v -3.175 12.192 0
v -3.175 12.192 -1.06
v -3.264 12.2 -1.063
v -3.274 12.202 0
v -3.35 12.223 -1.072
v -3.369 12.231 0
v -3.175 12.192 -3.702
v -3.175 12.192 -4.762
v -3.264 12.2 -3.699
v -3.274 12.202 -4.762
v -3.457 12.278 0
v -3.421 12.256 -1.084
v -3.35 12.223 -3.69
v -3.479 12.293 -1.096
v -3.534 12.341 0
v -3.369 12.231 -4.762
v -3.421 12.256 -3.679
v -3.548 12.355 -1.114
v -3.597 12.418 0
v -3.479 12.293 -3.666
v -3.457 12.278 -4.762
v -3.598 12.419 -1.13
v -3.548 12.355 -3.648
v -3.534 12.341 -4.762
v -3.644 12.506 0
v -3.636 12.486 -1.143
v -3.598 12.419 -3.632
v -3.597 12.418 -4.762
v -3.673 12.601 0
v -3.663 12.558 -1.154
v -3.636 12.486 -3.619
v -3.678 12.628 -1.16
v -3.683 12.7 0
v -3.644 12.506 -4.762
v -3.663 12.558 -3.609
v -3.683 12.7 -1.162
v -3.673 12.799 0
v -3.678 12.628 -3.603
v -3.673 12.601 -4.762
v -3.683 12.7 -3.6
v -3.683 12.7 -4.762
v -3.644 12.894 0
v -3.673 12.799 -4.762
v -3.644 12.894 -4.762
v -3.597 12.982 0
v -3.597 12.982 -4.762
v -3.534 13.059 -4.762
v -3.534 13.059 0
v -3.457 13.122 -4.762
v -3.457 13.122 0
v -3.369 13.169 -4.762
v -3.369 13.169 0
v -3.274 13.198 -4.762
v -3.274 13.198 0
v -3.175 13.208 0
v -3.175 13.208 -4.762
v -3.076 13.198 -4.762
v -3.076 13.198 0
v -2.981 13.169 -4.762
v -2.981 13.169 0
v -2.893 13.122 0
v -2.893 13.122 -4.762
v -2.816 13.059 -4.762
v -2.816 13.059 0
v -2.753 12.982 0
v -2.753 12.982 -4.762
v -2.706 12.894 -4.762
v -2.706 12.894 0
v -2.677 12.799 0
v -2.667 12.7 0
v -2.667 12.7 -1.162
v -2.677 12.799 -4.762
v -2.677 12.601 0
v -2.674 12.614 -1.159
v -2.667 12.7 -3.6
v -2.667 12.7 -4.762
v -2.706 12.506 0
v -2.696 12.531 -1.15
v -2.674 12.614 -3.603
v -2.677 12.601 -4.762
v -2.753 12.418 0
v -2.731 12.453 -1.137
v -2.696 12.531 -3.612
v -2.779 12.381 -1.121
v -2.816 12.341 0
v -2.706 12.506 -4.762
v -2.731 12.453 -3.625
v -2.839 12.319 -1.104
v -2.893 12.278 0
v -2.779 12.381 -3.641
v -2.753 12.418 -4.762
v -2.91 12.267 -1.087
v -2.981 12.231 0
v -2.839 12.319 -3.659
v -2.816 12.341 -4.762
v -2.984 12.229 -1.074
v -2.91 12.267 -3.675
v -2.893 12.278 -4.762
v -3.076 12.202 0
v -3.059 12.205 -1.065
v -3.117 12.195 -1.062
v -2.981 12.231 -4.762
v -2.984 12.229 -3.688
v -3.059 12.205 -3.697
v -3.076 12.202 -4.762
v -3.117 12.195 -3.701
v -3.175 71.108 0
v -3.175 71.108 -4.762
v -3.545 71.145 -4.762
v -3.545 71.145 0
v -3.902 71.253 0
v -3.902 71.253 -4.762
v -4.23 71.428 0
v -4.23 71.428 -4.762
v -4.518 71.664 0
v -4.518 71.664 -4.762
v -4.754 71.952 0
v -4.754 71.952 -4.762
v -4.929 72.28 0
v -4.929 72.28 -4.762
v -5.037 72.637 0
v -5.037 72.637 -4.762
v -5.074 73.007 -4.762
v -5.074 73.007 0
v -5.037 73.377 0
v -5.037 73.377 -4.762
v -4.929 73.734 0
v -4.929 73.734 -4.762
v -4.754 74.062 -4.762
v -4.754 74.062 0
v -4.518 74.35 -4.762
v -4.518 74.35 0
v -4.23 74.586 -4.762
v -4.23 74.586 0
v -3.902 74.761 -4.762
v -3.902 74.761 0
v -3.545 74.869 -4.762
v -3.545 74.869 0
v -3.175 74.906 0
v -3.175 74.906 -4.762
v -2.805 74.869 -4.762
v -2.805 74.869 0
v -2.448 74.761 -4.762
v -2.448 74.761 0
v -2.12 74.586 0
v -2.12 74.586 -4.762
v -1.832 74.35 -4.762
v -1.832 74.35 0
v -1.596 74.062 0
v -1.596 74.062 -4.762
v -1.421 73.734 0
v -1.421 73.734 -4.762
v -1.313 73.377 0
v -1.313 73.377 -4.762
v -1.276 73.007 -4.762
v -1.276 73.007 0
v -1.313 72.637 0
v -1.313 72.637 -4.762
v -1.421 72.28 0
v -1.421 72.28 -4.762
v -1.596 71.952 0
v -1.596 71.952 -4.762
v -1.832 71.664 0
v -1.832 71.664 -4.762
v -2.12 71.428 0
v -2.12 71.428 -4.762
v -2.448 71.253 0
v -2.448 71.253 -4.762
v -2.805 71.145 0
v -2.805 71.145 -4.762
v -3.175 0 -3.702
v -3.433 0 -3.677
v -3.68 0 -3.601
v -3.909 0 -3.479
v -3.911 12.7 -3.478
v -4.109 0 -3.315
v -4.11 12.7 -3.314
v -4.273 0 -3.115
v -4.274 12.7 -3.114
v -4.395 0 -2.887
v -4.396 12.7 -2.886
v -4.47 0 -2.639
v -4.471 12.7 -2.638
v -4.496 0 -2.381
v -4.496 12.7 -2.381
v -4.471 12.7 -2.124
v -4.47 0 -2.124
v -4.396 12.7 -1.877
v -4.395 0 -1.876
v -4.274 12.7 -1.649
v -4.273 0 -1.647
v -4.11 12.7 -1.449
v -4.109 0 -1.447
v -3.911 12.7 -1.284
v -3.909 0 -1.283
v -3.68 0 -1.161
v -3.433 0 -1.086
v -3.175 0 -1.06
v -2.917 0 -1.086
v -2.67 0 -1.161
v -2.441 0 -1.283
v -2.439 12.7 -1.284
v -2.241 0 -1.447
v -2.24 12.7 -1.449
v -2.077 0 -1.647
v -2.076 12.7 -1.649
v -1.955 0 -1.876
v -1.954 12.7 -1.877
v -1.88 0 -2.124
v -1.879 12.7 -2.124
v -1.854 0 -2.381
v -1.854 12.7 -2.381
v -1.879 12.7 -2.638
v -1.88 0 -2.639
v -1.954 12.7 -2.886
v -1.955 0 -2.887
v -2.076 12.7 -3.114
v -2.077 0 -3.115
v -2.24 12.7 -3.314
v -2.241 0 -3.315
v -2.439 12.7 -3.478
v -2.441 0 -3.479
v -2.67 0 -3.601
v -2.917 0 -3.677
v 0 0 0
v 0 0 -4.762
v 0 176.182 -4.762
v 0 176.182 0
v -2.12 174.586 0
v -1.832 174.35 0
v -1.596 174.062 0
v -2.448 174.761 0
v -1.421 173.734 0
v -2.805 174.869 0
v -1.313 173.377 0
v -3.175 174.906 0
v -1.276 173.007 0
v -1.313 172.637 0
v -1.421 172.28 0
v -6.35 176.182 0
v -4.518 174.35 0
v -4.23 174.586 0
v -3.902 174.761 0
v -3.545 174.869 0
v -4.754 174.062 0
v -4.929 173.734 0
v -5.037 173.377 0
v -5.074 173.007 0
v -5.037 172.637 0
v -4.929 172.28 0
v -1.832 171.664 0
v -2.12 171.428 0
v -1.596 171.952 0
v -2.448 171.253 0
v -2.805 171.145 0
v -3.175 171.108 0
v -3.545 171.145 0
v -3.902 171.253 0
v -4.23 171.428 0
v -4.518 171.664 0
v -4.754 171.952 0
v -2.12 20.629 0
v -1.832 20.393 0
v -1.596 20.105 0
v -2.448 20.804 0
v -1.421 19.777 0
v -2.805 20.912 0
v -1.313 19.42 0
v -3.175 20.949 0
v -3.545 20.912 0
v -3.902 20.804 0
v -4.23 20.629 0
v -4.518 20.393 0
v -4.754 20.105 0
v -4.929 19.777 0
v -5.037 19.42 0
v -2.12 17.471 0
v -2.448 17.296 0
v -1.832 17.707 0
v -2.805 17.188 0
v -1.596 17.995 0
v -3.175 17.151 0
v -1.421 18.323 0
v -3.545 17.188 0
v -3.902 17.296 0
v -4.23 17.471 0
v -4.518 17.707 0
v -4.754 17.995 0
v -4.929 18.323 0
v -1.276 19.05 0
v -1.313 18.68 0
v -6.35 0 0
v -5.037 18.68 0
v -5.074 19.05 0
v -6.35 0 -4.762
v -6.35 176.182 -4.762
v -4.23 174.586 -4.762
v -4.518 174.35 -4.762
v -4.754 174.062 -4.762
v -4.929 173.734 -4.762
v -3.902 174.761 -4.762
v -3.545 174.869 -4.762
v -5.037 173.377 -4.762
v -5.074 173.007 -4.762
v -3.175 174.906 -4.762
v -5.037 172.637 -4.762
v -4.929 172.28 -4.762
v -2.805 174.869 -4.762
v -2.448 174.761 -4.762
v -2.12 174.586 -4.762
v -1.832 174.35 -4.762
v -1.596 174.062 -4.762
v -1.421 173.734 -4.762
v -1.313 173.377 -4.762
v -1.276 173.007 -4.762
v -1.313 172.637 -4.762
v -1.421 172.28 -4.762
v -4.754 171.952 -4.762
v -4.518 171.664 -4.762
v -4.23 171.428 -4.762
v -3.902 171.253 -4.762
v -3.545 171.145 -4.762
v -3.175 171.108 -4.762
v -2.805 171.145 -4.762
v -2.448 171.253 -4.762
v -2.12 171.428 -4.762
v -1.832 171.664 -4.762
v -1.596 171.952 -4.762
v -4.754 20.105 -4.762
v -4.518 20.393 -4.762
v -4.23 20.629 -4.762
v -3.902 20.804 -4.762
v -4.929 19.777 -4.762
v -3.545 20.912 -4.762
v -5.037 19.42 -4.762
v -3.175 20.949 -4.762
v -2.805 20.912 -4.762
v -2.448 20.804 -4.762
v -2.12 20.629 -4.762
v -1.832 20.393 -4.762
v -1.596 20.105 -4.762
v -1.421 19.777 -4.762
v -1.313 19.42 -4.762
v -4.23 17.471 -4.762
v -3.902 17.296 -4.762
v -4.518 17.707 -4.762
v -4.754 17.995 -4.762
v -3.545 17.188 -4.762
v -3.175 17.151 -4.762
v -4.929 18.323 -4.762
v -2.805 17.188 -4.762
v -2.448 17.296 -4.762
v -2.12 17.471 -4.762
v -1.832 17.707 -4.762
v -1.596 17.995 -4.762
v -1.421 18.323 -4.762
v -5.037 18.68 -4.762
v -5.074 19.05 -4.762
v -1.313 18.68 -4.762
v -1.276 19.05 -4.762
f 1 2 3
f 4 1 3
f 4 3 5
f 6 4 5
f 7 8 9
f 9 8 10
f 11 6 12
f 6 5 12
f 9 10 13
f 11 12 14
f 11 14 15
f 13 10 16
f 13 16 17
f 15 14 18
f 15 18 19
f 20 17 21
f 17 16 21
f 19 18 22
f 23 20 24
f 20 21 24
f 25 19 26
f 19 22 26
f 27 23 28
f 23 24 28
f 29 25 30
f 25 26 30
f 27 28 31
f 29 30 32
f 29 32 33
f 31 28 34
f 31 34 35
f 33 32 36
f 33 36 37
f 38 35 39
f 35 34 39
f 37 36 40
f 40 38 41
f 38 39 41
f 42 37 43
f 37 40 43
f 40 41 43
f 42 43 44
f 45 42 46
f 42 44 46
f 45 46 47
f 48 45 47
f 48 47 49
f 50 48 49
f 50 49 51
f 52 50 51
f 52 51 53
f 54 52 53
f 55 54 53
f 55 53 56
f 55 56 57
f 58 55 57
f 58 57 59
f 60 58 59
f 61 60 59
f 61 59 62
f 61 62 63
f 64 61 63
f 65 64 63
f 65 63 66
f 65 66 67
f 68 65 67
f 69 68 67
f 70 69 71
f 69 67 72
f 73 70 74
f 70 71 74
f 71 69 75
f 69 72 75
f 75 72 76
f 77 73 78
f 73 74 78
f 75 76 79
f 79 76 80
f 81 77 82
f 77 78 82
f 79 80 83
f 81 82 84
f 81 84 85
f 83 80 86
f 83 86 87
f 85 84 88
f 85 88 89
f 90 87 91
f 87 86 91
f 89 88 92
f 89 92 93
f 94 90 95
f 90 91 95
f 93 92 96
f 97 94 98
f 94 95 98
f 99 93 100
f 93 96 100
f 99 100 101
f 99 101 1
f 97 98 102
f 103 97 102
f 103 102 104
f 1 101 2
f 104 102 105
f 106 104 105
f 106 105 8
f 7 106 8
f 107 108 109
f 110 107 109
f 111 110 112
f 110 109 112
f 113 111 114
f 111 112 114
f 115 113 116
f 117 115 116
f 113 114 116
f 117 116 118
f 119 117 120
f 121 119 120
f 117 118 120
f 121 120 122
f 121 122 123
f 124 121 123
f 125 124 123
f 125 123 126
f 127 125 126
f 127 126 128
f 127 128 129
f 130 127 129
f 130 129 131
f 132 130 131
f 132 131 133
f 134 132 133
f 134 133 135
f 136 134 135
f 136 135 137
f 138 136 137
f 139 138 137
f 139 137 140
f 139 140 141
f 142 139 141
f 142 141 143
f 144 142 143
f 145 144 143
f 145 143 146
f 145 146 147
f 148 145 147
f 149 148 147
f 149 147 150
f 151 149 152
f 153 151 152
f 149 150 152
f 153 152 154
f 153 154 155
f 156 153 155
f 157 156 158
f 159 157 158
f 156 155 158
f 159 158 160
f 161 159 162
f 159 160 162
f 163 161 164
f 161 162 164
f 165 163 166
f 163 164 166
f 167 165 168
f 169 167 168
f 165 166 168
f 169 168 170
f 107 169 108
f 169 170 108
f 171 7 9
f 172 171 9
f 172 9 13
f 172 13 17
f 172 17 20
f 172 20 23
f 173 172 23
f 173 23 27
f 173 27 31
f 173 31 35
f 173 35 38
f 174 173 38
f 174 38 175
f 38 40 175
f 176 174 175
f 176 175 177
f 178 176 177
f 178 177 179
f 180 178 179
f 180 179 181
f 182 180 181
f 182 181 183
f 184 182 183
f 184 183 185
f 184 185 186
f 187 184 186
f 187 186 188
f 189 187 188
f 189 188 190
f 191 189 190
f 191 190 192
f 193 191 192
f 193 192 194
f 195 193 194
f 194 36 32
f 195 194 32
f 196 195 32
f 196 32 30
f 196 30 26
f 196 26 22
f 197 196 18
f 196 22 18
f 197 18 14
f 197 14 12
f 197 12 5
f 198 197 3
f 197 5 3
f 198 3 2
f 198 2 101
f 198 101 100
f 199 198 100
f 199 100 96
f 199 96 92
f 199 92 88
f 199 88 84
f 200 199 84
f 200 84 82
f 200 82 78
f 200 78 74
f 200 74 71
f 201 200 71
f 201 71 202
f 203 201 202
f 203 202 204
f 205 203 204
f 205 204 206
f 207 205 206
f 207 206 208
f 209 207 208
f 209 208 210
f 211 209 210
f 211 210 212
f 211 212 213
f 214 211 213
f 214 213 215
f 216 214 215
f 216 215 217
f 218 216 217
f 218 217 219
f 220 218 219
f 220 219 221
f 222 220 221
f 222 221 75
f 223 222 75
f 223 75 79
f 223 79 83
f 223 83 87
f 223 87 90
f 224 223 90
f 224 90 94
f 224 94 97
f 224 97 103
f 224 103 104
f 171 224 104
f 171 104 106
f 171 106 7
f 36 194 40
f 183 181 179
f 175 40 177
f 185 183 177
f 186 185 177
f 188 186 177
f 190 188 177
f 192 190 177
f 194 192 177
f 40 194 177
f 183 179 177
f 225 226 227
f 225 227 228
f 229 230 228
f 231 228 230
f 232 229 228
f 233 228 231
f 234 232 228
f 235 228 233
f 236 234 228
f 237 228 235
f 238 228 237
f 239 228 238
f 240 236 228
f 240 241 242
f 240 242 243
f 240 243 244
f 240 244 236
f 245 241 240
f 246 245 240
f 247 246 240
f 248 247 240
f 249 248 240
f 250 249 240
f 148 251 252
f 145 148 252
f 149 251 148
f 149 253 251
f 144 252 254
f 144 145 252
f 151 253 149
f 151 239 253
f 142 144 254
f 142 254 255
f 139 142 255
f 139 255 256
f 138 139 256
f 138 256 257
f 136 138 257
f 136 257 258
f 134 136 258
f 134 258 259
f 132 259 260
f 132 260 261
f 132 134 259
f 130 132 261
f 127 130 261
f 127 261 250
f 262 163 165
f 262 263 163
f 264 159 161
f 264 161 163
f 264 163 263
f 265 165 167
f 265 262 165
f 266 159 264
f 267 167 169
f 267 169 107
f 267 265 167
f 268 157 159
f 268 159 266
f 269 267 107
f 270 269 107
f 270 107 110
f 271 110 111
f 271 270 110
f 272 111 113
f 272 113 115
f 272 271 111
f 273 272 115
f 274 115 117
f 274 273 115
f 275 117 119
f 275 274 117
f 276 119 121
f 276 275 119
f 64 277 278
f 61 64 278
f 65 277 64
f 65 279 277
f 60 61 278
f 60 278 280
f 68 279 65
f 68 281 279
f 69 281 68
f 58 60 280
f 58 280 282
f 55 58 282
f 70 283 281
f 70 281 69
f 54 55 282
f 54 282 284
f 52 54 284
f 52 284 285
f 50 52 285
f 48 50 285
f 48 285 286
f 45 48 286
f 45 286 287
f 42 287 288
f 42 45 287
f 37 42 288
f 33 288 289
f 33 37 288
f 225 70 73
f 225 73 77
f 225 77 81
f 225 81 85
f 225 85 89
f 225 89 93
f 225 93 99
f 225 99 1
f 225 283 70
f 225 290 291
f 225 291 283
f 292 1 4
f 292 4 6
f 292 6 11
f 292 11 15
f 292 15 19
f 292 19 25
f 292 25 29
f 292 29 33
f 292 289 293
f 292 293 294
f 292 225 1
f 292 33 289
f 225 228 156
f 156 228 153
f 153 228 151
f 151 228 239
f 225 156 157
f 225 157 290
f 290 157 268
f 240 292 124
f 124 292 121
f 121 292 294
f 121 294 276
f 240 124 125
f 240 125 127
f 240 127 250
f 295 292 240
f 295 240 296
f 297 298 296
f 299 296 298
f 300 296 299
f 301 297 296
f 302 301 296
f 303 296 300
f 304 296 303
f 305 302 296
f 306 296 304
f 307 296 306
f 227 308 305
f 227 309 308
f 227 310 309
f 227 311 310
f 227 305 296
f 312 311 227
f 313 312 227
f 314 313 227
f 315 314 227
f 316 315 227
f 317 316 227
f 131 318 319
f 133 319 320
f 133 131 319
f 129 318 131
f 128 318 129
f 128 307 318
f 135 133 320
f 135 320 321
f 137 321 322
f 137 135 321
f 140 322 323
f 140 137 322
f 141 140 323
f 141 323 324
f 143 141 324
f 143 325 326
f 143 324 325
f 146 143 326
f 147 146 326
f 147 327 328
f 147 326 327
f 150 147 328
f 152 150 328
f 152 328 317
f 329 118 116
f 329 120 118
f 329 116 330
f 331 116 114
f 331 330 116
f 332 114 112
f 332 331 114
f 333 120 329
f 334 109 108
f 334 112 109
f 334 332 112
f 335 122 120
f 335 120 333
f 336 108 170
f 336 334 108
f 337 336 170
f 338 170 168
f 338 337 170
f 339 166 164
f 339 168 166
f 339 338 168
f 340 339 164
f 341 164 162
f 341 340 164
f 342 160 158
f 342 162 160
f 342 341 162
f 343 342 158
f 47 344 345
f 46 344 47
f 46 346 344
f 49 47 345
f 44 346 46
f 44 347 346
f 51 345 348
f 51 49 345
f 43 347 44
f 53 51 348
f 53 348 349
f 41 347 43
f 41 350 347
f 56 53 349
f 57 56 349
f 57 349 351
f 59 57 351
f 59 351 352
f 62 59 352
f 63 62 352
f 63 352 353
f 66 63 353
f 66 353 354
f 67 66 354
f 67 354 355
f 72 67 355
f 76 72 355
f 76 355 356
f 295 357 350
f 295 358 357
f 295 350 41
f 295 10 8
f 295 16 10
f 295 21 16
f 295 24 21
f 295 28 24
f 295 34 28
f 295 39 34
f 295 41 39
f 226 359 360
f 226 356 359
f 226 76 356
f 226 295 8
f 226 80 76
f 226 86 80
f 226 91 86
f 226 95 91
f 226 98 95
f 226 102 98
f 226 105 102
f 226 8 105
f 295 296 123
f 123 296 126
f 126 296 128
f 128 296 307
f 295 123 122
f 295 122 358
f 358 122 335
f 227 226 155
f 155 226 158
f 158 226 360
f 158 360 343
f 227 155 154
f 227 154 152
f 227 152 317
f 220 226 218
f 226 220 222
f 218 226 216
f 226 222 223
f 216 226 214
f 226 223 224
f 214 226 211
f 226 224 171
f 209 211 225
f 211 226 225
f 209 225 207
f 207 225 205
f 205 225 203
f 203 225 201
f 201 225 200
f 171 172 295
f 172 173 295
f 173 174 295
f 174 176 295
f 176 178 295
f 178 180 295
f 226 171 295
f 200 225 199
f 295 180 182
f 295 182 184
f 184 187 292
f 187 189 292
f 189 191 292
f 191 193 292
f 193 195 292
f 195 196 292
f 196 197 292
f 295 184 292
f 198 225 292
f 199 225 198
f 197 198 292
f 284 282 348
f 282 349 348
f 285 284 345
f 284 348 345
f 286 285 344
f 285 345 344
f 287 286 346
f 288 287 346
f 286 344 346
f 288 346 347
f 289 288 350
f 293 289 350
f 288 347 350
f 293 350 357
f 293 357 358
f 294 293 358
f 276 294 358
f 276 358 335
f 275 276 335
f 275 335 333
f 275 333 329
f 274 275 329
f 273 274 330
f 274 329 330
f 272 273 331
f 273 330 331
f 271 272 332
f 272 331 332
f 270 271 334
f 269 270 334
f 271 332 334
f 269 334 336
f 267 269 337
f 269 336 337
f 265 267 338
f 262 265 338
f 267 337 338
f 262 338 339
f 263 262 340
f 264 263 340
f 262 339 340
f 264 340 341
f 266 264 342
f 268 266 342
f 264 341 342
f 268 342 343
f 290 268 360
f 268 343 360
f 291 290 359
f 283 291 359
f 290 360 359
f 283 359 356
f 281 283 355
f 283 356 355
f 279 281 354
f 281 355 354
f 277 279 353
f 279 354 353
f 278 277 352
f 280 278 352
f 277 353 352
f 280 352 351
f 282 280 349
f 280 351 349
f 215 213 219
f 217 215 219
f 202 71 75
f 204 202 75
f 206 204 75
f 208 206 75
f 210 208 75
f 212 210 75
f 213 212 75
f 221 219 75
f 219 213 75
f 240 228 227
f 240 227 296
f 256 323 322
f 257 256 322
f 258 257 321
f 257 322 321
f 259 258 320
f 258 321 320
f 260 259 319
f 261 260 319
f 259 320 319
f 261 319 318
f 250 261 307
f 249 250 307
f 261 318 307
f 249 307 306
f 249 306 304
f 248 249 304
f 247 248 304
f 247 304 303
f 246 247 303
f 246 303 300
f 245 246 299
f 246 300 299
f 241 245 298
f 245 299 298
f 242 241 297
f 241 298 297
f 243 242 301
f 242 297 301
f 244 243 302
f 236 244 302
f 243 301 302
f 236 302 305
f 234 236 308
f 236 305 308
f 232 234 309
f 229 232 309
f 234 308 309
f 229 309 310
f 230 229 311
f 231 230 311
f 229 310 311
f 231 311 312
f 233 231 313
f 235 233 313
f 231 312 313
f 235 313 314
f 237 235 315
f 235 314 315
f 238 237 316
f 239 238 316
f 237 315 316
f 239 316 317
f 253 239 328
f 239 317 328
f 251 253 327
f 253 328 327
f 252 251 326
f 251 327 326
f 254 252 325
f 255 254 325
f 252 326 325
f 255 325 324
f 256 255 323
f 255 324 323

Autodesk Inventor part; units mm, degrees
ref_plane "YZ Plane" through (0, 0, 0) normal (1, 0, 0) x (0, 1, 0)
ref_plane "XZ Plane" through (0, 0, 0) normal (0, 1, 0) x (-1, 0, 0)
ref_plane "XY Plane" through (0, 0, 0) normal (0, 0, 1) x (1, 0, 0)
sketch "Sketch1" plane through (0, 0, 0) normal (0, 1, 0) x (-1, 0, 0)
  line L0 (0, 0) -> (6.35, 0)
  line L1 (6.35, 0) -> (6.35, -4.7625)
  line L2 (6.35, -4.7625) -> (0, -4.7625)
  line L3 (0, -4.7625) -> (0, 0)
  circle A0 centre (3.175, -2.3812) radius 1.7526
  dimension "d0" = 6.35
  dimension "d1" = 4.7625
  dimension "d2" = 3.5052
extrude "Extrusion1" add sketch "Sketch1" along normal blind 176.182 contours L0 L1 L2 L3 | A0
sketch "Sketch2" plane through (-6.35, 0, 0) normal (0, 0, 1) x (1, 0, 0)
  line L0 (6.35, 176.182) -> (0, 176.182) projected
  line L1 (3.175, 176.182) -> (3.175, 173.007)
  circle A0 centre (3.175, 173.007) radius 1.7526
  line L2 (6.35, 0) -> (0, 0) projected
  line L3 (3.175, 0) -> (3.175, 19.05)
  circle A1 centre (3.175, 19.05) radius 1.7526
  line L4 (3.175, 0) -> (3.175, 12.7)
  circle A2 centre (3.175, 12.7) radius 0.508
  line L5 (3.175, 173.007) -> (3.175, 73.007)
  circle A3 centre (3.175, 73.007) radius 1.7526
  dimension "d5" = 3.175
  dimension "d6" = 3.5052
  dimension "d14" = 19.05
  dimension "d15" = 3.5052
  dimension "d16" = 12.7
  dimension "d17" = 1.016
  dimension "d47" = 100.0001
  dimension "d48" = 3.5052
hole "Hole2" at (-3.175, 19.05, 0) direction (0, 0, -1) diameter 3.7973 end through all clearance for "Flat Head Machine Screw (82)" size "#6" standard "Ansi Unified Screw Threads"
hole "Hole3" at (-3.175, 12.7, 0) direction (0, 0, -1) diameter 1.016 end through all
hole "Hole4" at (-3.175, 173.007, 0) direction (0, 0, -1) diameter 3.7973 end through all clearance for "Flat Head Machine Screw (82)" size "#6" standard "Ansi Unified Screw Threads"
sketch "Sketch3" plane through (0, 0, 0) normal (0, -1, 0) x (1, 0, 0)
  line L0 (0, -4.7625) -> (-6.35, -4.7625) projected
  line L1 (-6.35, -4.7625) -> (0, 0)
  circle A0 centre (-3.175, -2.3812) radius 1.3208
  dimension "d39" = 2.6416
hole "Hole5" at (-3.175, 0, -2.3812) direction (0, 1, 0) diameter 2.6416 depth 12.7 thread size "6-32 UNC" class "2B" standard "ANSI Unified Screw Threads"
hole "Hole6" at (-3.175, 73.007, 0) direction (0, 0, -1) diameter 3.7973 end through all clearance for "Flat Head Machine Screw (82)" size "#6" standard "Ansi Unified Screw Threads"
properties part number "rod(6-32)"
